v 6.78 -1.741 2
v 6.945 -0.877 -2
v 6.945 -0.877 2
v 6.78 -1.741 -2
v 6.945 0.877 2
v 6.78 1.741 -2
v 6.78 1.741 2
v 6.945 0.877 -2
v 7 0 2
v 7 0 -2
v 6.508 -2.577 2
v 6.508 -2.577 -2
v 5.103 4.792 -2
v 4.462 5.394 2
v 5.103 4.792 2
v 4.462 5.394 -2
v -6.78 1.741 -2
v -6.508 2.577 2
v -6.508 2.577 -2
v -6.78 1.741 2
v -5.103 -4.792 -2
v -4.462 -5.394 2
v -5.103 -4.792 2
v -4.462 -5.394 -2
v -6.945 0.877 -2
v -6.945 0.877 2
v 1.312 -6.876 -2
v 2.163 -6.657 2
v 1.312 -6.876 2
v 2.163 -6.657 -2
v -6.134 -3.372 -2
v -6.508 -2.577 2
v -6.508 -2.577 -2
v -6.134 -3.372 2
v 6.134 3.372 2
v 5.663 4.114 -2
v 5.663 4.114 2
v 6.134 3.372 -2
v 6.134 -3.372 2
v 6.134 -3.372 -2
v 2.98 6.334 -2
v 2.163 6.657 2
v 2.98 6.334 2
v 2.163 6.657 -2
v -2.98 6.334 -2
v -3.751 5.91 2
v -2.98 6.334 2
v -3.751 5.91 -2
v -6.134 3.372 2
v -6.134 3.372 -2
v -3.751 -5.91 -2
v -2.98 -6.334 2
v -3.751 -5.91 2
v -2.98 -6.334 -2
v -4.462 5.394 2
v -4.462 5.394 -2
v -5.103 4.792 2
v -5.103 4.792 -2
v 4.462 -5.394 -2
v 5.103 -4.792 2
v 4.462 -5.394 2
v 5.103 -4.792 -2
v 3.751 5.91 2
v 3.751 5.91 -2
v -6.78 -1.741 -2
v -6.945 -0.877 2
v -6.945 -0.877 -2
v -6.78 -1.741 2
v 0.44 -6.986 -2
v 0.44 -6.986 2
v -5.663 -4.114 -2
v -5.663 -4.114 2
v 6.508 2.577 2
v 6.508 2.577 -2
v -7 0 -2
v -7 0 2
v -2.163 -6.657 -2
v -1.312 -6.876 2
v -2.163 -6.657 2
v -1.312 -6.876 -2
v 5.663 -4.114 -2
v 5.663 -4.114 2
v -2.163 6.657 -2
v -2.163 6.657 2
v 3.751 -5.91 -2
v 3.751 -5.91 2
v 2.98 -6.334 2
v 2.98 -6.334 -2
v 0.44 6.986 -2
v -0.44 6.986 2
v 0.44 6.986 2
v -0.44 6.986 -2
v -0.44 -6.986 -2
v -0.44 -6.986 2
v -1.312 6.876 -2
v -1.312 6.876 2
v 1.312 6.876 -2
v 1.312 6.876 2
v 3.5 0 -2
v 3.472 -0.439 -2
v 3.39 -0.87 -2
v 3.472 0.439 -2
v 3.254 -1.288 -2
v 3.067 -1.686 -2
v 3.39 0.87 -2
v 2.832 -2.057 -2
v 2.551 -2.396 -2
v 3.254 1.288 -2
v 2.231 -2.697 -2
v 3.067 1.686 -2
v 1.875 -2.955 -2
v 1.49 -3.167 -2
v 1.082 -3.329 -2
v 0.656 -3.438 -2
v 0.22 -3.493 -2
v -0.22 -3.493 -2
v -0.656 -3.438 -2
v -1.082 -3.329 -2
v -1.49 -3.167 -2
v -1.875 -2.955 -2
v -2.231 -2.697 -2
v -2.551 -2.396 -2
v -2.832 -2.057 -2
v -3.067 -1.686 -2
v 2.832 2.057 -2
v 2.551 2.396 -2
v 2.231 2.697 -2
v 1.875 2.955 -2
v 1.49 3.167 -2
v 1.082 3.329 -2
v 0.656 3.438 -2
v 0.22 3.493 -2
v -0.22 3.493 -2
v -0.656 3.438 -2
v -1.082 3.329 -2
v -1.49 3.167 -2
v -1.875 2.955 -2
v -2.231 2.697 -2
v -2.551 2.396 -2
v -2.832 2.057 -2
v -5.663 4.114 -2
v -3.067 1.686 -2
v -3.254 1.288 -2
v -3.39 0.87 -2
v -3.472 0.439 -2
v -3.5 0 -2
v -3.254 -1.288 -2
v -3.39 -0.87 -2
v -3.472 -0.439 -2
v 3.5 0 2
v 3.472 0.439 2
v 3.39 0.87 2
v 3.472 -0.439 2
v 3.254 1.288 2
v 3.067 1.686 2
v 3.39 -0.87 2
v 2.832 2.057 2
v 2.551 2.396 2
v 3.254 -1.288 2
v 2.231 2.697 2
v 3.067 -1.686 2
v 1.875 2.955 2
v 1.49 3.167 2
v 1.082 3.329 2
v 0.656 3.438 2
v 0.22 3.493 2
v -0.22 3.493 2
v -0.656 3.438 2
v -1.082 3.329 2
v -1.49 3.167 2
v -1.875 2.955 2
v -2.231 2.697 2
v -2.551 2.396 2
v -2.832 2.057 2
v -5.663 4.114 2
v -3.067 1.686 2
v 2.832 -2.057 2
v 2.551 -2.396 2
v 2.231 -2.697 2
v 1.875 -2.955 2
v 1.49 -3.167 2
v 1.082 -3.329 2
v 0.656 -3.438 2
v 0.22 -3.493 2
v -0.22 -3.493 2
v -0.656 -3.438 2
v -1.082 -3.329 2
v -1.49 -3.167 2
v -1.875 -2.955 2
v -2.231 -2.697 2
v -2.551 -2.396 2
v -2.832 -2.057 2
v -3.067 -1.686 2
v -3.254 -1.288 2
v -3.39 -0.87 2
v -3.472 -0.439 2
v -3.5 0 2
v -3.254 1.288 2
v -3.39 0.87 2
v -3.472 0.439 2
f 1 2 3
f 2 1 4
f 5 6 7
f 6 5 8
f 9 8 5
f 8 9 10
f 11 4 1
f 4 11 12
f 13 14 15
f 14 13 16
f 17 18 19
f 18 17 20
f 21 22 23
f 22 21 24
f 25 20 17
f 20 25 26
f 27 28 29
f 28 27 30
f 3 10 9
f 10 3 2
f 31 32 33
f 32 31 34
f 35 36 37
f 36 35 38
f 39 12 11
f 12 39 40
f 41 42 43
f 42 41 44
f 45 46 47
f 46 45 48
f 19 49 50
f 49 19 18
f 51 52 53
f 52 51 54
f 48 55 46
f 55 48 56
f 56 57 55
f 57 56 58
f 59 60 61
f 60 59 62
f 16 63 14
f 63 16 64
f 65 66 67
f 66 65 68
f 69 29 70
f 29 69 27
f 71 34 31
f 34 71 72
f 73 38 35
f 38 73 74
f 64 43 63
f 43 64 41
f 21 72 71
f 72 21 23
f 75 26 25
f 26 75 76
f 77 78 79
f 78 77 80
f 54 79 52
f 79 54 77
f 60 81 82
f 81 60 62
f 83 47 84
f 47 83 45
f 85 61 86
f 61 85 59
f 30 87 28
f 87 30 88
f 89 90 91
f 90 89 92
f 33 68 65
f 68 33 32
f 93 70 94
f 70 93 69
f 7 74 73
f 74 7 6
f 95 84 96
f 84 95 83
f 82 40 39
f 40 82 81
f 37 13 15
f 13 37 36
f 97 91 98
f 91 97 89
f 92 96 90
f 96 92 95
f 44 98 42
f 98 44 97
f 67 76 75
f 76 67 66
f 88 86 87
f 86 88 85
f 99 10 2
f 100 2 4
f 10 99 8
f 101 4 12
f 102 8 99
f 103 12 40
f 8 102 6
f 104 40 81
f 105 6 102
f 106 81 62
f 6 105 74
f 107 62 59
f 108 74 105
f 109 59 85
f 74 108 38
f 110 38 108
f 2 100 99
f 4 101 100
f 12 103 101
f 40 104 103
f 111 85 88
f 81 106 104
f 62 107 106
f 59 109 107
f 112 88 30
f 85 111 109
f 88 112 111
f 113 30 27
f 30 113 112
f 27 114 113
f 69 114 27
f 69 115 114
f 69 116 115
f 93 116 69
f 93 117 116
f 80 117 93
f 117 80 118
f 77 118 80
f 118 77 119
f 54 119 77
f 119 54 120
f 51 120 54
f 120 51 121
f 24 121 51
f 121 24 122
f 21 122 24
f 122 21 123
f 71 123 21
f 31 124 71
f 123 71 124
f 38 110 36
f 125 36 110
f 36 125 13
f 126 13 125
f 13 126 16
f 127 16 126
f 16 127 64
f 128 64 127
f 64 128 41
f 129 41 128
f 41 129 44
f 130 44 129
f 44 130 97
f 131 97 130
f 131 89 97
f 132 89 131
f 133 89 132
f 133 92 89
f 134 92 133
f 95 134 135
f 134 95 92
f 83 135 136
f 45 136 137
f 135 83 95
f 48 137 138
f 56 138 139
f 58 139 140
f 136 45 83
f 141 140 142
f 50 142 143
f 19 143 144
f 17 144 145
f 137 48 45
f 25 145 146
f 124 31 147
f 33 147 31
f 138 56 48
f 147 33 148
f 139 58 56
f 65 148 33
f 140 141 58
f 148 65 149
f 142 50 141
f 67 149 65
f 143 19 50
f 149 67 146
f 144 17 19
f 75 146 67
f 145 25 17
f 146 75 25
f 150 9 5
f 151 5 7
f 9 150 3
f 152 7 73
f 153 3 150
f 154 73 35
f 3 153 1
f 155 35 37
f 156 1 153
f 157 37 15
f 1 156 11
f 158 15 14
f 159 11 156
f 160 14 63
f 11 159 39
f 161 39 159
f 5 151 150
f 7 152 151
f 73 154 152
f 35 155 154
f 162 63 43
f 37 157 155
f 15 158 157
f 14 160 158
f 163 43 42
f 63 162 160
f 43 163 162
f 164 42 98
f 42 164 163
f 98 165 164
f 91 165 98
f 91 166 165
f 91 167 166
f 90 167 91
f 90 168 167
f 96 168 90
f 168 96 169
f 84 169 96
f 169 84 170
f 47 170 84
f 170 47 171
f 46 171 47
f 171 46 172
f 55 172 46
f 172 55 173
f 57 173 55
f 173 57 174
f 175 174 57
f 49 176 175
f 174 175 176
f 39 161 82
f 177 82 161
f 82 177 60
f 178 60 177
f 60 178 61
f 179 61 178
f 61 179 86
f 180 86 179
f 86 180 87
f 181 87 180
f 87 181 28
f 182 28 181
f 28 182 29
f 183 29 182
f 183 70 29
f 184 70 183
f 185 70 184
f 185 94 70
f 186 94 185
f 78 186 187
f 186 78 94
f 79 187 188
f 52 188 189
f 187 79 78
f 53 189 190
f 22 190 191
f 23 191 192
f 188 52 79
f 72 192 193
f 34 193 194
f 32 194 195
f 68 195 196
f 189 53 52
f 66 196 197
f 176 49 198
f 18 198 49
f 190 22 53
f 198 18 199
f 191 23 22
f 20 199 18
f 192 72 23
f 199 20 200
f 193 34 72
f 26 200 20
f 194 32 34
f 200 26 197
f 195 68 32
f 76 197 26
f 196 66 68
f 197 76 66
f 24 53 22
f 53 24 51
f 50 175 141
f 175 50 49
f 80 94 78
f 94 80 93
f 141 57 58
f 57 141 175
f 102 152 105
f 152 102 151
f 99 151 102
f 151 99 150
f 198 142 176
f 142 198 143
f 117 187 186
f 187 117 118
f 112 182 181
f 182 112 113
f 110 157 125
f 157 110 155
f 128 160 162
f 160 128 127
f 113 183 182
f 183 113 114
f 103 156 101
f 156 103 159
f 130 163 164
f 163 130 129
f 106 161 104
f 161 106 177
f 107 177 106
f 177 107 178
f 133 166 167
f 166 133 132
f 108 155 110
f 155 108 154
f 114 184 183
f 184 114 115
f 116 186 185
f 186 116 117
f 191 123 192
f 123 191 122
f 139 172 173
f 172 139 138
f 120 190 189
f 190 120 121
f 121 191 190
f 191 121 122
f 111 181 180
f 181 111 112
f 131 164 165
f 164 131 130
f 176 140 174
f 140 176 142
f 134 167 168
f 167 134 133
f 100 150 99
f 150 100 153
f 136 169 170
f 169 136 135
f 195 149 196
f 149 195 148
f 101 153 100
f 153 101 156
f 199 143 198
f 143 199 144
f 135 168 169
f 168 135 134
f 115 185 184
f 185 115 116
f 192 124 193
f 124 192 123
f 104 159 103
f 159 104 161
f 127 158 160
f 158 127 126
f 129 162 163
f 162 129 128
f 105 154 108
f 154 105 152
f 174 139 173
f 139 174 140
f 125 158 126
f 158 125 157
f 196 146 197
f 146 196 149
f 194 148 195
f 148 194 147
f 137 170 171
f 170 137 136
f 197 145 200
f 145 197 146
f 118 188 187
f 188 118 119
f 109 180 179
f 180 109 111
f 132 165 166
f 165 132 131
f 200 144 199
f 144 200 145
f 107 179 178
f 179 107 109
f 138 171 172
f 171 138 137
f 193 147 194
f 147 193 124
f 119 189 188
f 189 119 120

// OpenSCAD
$fn = 50;


difference() {
	union() {
		translate(v = [0, 0, -2.0000000000]) {
			cylinder(h = 4, r = 7.0000000000);
		}
	}
	union() {
		translate(v = [0, 0, -100.0000000000]) {
			cylinder(h = 200, r = 3.5000000000);
		}
	}
}
